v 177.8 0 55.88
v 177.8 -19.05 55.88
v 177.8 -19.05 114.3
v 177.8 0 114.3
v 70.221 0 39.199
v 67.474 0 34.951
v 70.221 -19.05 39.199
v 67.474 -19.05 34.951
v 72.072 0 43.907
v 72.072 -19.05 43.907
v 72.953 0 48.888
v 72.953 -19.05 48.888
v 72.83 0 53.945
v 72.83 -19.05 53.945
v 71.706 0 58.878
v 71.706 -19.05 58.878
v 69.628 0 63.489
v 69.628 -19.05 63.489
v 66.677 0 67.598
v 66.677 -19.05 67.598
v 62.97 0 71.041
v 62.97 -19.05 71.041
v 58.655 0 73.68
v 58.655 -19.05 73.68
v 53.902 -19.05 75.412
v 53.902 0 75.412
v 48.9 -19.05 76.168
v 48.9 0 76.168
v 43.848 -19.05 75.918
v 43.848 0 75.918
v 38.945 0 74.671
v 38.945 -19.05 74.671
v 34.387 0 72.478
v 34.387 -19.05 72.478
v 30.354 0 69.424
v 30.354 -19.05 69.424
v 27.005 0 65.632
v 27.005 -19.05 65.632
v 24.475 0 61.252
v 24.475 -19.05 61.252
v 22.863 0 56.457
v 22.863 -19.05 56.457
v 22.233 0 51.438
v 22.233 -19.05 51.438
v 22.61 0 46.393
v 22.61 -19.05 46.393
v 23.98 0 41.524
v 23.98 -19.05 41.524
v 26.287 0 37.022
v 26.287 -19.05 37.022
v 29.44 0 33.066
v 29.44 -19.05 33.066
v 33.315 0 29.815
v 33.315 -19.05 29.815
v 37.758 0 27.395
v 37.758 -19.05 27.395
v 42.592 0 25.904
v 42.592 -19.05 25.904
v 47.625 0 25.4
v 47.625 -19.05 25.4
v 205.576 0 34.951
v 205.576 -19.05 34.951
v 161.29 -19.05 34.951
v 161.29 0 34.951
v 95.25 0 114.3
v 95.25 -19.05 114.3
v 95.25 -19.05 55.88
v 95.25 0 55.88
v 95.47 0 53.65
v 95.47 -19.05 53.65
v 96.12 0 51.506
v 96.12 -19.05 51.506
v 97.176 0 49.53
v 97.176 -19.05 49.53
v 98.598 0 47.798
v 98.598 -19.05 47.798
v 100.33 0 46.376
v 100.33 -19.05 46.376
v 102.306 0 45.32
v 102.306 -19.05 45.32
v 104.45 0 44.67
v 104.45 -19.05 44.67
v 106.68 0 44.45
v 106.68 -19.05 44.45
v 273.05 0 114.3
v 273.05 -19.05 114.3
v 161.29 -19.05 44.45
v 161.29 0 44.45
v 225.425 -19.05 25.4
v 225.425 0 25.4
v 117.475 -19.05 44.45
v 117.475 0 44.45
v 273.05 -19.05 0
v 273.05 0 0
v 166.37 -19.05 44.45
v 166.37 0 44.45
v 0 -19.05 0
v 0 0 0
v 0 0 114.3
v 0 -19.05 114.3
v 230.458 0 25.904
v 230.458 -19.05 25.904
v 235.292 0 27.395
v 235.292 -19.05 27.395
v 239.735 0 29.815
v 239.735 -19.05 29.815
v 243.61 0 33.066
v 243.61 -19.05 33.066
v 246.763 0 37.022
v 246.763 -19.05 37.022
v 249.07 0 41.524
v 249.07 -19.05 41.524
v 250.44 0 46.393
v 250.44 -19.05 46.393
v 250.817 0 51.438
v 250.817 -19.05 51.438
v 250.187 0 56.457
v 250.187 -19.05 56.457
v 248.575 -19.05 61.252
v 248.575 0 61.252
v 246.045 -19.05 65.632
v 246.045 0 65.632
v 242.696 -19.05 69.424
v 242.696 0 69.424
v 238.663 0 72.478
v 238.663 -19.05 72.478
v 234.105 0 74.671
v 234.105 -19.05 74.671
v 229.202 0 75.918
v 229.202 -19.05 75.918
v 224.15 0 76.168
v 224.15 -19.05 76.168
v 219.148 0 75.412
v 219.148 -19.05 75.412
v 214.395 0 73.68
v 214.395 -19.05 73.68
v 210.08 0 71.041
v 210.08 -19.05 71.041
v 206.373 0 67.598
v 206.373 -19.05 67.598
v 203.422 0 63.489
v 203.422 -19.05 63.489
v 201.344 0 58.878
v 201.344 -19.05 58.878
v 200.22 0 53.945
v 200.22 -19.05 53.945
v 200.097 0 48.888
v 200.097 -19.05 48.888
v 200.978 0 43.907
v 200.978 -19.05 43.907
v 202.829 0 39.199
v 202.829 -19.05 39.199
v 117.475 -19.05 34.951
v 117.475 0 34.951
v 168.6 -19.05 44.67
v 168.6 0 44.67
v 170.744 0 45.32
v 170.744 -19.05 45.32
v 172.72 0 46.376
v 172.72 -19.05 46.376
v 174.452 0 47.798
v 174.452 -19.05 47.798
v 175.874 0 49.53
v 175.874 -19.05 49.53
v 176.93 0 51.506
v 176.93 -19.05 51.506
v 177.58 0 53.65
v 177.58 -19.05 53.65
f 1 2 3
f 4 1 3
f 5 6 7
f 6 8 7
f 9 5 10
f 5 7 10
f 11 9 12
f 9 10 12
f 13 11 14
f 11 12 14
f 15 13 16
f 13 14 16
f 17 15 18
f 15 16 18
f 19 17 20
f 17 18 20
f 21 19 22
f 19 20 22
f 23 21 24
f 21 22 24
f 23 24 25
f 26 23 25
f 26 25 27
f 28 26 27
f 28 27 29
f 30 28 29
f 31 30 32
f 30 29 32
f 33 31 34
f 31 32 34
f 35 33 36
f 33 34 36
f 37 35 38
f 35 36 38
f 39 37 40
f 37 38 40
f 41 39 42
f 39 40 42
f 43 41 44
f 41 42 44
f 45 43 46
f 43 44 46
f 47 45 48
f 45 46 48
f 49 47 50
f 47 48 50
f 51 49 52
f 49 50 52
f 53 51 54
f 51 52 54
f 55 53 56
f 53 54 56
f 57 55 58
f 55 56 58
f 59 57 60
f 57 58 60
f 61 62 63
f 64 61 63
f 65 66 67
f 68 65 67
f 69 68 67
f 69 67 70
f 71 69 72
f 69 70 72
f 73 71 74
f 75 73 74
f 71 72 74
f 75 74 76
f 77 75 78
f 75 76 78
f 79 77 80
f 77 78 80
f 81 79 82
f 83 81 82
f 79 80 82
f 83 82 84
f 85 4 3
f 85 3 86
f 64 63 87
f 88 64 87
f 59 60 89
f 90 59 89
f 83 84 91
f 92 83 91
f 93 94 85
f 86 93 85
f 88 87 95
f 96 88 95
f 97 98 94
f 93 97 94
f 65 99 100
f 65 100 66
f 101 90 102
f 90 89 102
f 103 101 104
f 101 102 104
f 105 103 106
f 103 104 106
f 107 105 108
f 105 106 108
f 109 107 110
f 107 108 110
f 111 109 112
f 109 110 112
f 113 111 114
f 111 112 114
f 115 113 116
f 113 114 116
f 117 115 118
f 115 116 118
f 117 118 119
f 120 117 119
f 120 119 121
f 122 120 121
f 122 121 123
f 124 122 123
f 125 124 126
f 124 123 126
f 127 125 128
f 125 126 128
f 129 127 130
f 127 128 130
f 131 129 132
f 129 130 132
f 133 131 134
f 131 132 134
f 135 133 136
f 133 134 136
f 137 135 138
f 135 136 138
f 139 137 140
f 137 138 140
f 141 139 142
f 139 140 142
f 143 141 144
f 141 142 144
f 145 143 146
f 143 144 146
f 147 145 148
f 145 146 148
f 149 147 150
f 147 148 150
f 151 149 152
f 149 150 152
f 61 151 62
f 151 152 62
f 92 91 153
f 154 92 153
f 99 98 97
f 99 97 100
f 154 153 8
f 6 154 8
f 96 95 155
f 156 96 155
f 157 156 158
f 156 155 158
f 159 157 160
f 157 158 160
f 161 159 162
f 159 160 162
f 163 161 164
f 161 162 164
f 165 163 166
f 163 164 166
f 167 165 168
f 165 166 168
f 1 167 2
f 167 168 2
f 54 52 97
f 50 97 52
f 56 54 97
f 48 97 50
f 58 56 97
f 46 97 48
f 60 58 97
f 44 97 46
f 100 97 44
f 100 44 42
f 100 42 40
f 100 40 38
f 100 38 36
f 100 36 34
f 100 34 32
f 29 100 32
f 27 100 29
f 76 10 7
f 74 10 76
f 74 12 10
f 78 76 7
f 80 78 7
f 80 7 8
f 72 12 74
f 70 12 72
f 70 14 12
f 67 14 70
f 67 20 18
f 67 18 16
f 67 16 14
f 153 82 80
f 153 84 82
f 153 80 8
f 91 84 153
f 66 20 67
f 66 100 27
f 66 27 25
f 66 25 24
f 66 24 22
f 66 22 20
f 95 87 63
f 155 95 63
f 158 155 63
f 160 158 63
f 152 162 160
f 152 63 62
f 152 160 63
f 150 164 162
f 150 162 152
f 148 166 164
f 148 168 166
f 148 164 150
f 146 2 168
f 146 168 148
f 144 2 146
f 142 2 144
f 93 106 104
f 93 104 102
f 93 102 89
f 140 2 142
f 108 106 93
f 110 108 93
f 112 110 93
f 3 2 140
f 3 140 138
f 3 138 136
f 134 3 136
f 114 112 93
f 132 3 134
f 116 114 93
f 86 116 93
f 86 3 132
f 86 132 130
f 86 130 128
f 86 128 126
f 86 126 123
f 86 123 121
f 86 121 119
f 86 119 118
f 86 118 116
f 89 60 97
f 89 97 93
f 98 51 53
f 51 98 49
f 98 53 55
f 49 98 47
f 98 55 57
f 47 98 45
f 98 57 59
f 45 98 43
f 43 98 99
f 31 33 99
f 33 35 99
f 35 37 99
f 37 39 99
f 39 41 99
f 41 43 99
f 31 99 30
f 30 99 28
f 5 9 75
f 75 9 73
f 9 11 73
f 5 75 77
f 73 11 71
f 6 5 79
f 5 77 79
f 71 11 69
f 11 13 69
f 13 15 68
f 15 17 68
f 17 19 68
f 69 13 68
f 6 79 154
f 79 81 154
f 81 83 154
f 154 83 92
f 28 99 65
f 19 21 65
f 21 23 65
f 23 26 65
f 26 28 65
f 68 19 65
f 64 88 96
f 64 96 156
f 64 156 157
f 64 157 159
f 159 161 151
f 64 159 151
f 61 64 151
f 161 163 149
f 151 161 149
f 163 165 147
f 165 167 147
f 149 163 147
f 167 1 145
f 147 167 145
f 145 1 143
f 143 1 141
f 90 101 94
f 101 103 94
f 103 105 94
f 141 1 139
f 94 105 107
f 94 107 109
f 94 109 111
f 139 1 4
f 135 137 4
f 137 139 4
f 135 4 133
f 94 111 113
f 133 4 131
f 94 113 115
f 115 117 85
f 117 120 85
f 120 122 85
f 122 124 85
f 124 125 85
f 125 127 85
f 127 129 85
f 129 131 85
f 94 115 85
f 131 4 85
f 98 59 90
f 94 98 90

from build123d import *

# Parameters (mm, degrees)
F0_W     = 273.05
F0_H     = 114.3
F1_DEPTH = 19.05
F2_R     = 25.4
F3_DEPTH = 25.4
F5_DEPTH = 25.4
F7_DEPTH = 25.4


with BuildPart() as f1:
    # F0 (on Front) → F1 (new body)
    with BuildSketch(Plane.XZ):
        with Locations((136.525, 57.15)):
            Rectangle(F0_W, F0_H)
    extrude(amount=F1_DEPTH)

    # F2 (on face) → F3 (cut)
    with BuildSketch(Plane.XZ.offset(19.05)):
        with Locations((225.425, 50.8)):
            Circle(F2_R)
        with Locations((47.625, 50.8)):
            Circle(F2_R)
    extrude(amount=-F3_DEPTH, mode=Mode.SUBTRACT)

    # F4 (on face) → F5 (cut)
    with BuildSketch(Plane.XZ.offset(19.05)):
        with BuildLine():
            Line((177.8, 114.3), (95.25, 114.3))
            Line((95.25, 114.3), (95.25, 55.88))
            ThreePointArc((95.25, 55.88), (98.597769, 47.797769), (106.68, 44.45))
            Line((106.68, 44.45), (166.37, 44.45))
            ThreePointArc((166.37, 44.45), (174.452231, 47.797769), (177.8, 55.88))
            Line((177.8, 55.88), (177.8, 114.3))
        make_face()
    extrude(amount=-F5_DEPTH, mode=Mode.SUBTRACT)

    # F6 (on face) → F7 (cut)
    with BuildSketch(Plane.XZ.offset(19.05)):
        Polygon((117.475, 34.951167), (67.473791, 34.951167), (47.625, 25.4), (225.425, 25.4), (205.576209, 34.951167), (166.37, 34.951167), (161.29, 34.951167), (161.29, 44.45), (117.475, 44.45), align=None)
    extrude(amount=-F7_DEPTH, mode=Mode.SUBTRACT)


solid = f1.part
